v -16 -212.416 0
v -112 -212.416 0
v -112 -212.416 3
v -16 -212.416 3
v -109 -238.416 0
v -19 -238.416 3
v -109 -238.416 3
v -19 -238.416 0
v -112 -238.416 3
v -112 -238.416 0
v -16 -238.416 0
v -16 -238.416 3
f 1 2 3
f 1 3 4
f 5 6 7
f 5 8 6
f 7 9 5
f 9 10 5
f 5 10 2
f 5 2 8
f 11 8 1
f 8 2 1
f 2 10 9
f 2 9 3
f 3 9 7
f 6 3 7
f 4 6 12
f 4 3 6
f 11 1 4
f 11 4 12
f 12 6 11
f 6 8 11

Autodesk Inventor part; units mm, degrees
ref_plane "YZ Plane" through (0, 0, 0) normal (1, 0, 0) x (0, 1, 0)
ref_plane "XZ Plane" through (0, 0, 0) normal (0, 1, 0) x (-1, 0, 0)
ref_plane "Work Plane1" through (0, 0, 0) normal (0, 0, 1) x (1, 0, 0)
sketch "Sketch1" plane through (0, 0, 0) normal (0, 0, 1) x (1, 0, 0)
  line L0 (-109, -242.4163) -> (-109, -238.4163)
  line L1 (-119, -238.4163) -> (-109, -238.4163)
  arc A0 (-124, -233.4163) -> (-119, -238.4163) centre (-119, -233.4163) ccw
  line L2 (-124, -154.5344) -> (-124, -233.4163)
  arc A1 (-123.8494, -153.3167) -> (-124, -154.5344) centre (-119, -154.5344) ccw
  line L3 (-103.571, -72.5602) -> (-123.8494, -153.3167)
  arc A2 (-103.1284, -71.4158) -> (-103.571, -72.5602) centre (-98.7216, -73.7779) ccw
  line L4 (-68.4069, -6.6379) -> (-103.1284, -71.4158)
  arc A3 (-59.5931, -6.6379) -> (-68.4069, -6.6379) centre (-64, -9) ccw
  line L5 (-24.8716, -71.4158) -> (-59.5931, -6.6379)
  arc A4 (-24.429, -72.5602) -> (-24.8716, -71.4158) centre (-29.2784, -73.7779) ccw
  line L6 (-4.1506, -153.3167) -> (-24.429, -72.5602)
  arc A5 (-4, -154.5344) -> (-4.1506, -153.3167) centre (-9, -154.5344) ccw
  line L7 (-4, -233.4163) -> (-4, -154.5344)
  arc A6 (-9, -238.4163) -> (-4, -233.4163) centre (-9, -233.4163) ccw
  line L8 (-19, -238.4163) -> (-9, -238.4163)
  line L9 (-19, -238.4163) -> (-19, -242.4163)
  line L10 (-9, -242.4163) -> (-19, -242.4163)
  arc A7 (-9, -242.4163) -> (0, -233.4163) centre (-9, -233.4163) ccw
  line L11 (0, -154.5344) -> (0, -233.4163)
  arc A8 (0, -154.5344) -> (-0.271, -152.3425) centre (-9, -154.5344) ccw
  line L12 (-20.5494, -71.586) -> (-0.271, -152.3425)
  arc A9 (-20.5494, -71.586) -> (-21.3461, -69.5261) centre (-29.2784, -73.7779) ccw
  line L13 (-56.0677, -4.7482) -> (-21.3461, -69.5261)
  arc A10 (-56.0677, -4.7482) -> (-71.9323, -4.7482) centre (-64, -9) ccw
  line L14 (-106.6539, -69.5261) -> (-71.9323, -4.7482)
  arc A11 (-106.6539, -69.5261) -> (-107.4506, -71.586) centre (-98.7216, -73.7779) ccw
  line L15 (-127.729, -152.3425) -> (-107.4506, -71.586)
  arc A12 (-127.729, -152.3425) -> (-128, -154.5344) centre (-119, -154.5344) ccw
  line L16 (-128, -233.4163) -> (-128, -154.5344)
  arc A13 (-128, -233.4163) -> (-119, -242.4163) centre (-119, -233.4163) ccw
  line L17 (-109, -242.4163) -> (-119, -242.4163)
  line L18 (-112, -212.4163) -> (-16, -212.4163)
  line L19 (-16, -212.4163) -> (-16, -238.4163)
  line L20 (-16, -238.4163) -> (-112, -238.4163)
  line L21 (-112, -238.4163) -> (-112, -212.4163)
  point P0 (0, 0)
  dimension "d8" = 12
  dimension "d9" = 12
  dimension "d10" = 26
extrude "Plate1" add sketch "Sketch1" along normal blind 3 contours L1 L21 L18 L19 L8 L20
ref_plane "midtplan" through (-64, -238.4163, 0) normal (-1, 0, 0) x (0, 0, 1)
equation "\"d9\" = d8"
equation "\"d7\" = Thickness"
equation "\"Thickness\" = pladetykkelse"
equation "\"BendRadius\" = 1.5 * Thickness"
equation "\"BendReliefWidth\" = Thickness"
equation "\"BendReliefDepth\" = 0.5 * Thickness"
equation "\"CornerReliefSize\" = 4 * Thickness"
equation "\"MinimumRemnant\" = 2 * Thickness"
equation "\"TransitionRadius\" = BendRadius"
equation "\"JacobiRadiusSize\" = BendRadius"
equation "\"GapSize\" = Thickness"
equation "\"pladetykkelse\" = 3"
equation "\"trappevinkel\" = 34.3deg"
equation "\"trappestifter_dia\" = 25"
equation "\"trappestifter_huldia\" = 25.8"
equation "\"trappestifter_skraa_huldia\" = 26.6"
equation "\"trappestifter_laengde\" = 228"
equation "\"perforeringsbredde\" = 6"
equation "\"perforeringshullaengde\" = 62.8"
equation "\"perforeringshullaengde_top\" = 61"
equation "\"perforeringshullaengde_bund\" = 61.6"
equation "\"perforeringsoffset\" = 8"
equation "\"perforeringsoffset_top\" = 8"
equation "\"perforeringsoffset_bund\" = 8"
equation "\"laskehul_dia\" = 13"
equation "\"balusterhul_udvidelse\" = 1"
equation "\"trinbredde\" = 1884"
properties part number "skot opad smal" material "S355MC"
